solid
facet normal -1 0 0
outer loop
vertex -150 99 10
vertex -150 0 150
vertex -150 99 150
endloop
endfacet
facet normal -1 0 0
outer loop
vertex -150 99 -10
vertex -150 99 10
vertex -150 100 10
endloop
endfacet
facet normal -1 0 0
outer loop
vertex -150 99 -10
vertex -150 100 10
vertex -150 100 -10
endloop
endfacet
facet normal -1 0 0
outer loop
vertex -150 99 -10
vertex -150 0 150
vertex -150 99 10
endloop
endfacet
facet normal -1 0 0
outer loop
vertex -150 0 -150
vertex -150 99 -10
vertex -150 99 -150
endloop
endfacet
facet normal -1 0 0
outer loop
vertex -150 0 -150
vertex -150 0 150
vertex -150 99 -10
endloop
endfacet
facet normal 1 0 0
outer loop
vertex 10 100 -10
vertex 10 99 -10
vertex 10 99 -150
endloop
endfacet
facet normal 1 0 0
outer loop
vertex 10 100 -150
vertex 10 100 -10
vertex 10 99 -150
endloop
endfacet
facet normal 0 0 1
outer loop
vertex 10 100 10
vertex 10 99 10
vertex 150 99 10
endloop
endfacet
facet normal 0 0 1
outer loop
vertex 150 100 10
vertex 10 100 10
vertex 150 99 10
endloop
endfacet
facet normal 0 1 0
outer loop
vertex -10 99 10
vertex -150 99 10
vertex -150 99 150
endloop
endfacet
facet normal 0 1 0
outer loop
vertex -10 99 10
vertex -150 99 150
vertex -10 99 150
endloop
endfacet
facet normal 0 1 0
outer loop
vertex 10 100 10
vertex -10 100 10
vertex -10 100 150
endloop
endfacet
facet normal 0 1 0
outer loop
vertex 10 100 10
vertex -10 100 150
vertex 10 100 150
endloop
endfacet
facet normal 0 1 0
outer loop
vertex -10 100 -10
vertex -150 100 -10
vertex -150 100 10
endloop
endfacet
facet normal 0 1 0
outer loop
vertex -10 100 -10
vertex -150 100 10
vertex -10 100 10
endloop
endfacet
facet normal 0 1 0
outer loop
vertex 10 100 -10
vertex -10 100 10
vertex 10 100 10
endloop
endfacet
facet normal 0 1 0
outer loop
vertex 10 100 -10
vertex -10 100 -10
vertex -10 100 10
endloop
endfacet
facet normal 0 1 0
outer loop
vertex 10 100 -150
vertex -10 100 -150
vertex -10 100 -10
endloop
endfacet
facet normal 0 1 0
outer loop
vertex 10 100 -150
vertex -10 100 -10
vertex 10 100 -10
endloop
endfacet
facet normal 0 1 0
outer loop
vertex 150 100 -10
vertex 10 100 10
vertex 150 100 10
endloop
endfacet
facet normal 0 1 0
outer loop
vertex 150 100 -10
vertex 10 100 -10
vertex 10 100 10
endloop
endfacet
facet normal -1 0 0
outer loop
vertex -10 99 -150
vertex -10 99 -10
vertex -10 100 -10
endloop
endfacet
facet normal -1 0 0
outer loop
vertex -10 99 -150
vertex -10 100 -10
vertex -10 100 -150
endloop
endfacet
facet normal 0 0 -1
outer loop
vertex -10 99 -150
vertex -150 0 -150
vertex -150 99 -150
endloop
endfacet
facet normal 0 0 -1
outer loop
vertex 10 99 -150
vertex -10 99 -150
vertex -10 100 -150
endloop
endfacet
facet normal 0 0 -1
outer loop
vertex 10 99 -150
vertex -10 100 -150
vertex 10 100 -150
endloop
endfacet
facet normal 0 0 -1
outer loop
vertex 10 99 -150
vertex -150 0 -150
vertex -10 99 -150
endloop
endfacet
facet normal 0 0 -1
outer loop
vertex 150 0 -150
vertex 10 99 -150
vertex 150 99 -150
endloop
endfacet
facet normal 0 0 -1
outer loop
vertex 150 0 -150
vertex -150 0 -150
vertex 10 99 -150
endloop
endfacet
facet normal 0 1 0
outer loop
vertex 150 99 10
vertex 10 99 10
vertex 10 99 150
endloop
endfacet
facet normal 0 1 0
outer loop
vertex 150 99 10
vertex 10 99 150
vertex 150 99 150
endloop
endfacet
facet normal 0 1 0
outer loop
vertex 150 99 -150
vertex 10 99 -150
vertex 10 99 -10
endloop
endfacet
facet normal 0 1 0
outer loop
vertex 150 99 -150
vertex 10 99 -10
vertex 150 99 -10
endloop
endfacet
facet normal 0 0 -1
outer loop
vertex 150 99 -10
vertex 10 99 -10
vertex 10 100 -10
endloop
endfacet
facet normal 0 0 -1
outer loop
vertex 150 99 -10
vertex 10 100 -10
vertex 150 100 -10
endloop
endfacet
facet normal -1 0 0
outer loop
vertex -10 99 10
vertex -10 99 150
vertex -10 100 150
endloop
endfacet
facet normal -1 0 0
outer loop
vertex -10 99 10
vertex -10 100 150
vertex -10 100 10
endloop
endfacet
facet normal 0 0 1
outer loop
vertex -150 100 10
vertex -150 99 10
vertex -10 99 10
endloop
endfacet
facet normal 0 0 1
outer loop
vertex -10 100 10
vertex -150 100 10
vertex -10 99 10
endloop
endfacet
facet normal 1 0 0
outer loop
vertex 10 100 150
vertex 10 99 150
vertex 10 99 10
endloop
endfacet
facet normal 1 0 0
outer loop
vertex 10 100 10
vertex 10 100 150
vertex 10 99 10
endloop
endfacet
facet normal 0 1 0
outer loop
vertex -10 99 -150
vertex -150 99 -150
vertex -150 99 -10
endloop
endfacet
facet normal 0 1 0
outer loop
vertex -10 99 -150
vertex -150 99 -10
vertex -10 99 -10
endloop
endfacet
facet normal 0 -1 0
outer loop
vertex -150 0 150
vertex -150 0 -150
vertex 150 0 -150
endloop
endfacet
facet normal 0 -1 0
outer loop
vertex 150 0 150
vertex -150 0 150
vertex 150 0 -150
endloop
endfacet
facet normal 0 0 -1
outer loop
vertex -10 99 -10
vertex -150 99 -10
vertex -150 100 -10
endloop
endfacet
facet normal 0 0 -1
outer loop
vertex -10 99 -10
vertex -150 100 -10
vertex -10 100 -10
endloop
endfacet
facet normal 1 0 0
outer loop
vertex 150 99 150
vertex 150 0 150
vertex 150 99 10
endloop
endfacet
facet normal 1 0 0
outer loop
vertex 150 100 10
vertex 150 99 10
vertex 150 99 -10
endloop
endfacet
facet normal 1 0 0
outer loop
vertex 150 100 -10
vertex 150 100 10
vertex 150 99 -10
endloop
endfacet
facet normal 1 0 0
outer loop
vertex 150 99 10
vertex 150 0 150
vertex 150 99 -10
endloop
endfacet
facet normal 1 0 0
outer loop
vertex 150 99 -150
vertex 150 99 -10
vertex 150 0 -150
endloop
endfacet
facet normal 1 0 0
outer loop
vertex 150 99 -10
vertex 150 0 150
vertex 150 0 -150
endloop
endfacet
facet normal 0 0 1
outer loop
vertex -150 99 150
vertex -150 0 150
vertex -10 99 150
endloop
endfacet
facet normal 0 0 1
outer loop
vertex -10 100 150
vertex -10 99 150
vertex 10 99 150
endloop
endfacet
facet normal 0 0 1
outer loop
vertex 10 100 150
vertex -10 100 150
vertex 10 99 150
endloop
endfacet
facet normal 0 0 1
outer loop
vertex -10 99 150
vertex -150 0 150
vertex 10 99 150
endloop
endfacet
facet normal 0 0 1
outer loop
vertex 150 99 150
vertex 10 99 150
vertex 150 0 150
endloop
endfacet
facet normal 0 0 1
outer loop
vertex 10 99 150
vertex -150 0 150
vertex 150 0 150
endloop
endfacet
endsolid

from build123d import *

# Parameters (mm, degrees)
SKETCH_1_W      = 300
SKETCH_1_H      = 300
EXTRUDE_1_DEPTH = 90
SKETCH_2_W      = 20
SKETCH_2_H      = 300
SKETCH_2_W_2    = 300
SKETCH_2_H_2    = 20
EXTRUDE_3_DEPTH = 10
SKETCH_6_W      = 140
SKETCH_6_H      = 140
EXTRUDE_6_DEPTH = 9


with BuildPart() as part:
    # Эскиз1 → Бобышка-Вытянуть1 (new body)
    with BuildSketch(Plane(origin=(0, 0, 0), x_dir=(1, 0, 0), z_dir=(0, 1, 0))):
        Rectangle(SKETCH_1_W, SKETCH_1_H)
    extrude(amount=EXTRUDE_1_DEPTH)

    # Эскиз2 → Бобышка-Вытянуть3 (add)
    with BuildSketch(Plane(origin=(0, 90, 0), x_dir=(1, 0, 0), z_dir=(0, 1, 0))):
        Rectangle(SKETCH_2_W, SKETCH_2_H)
        Rectangle(SKETCH_2_W_2, SKETCH_2_H_2)
    extrude(amount=EXTRUDE_3_DEPTH)

    # Эскиз6 → Бобышка-Вытянуть6 (add)
    with BuildSketch(Plane(origin=(0, 90, 0), x_dir=(1, 0, 0), z_dir=(0, 1, 0))):
        with Locations((-80, -80)):
            Rectangle(SKETCH_6_W, SKETCH_6_H)
        with Locations((80, -80)):
            Rectangle(SKETCH_6_W, SKETCH_6_H)
        with Locations((80, 80)):
            Rectangle(SKETCH_6_W, SKETCH_6_H)
        with Locations((-80, 80)):
            Rectangle(SKETCH_6_W, SKETCH_6_H)
    extrude(amount=EXTRUDE_6_DEPTH)


solid = part.part
